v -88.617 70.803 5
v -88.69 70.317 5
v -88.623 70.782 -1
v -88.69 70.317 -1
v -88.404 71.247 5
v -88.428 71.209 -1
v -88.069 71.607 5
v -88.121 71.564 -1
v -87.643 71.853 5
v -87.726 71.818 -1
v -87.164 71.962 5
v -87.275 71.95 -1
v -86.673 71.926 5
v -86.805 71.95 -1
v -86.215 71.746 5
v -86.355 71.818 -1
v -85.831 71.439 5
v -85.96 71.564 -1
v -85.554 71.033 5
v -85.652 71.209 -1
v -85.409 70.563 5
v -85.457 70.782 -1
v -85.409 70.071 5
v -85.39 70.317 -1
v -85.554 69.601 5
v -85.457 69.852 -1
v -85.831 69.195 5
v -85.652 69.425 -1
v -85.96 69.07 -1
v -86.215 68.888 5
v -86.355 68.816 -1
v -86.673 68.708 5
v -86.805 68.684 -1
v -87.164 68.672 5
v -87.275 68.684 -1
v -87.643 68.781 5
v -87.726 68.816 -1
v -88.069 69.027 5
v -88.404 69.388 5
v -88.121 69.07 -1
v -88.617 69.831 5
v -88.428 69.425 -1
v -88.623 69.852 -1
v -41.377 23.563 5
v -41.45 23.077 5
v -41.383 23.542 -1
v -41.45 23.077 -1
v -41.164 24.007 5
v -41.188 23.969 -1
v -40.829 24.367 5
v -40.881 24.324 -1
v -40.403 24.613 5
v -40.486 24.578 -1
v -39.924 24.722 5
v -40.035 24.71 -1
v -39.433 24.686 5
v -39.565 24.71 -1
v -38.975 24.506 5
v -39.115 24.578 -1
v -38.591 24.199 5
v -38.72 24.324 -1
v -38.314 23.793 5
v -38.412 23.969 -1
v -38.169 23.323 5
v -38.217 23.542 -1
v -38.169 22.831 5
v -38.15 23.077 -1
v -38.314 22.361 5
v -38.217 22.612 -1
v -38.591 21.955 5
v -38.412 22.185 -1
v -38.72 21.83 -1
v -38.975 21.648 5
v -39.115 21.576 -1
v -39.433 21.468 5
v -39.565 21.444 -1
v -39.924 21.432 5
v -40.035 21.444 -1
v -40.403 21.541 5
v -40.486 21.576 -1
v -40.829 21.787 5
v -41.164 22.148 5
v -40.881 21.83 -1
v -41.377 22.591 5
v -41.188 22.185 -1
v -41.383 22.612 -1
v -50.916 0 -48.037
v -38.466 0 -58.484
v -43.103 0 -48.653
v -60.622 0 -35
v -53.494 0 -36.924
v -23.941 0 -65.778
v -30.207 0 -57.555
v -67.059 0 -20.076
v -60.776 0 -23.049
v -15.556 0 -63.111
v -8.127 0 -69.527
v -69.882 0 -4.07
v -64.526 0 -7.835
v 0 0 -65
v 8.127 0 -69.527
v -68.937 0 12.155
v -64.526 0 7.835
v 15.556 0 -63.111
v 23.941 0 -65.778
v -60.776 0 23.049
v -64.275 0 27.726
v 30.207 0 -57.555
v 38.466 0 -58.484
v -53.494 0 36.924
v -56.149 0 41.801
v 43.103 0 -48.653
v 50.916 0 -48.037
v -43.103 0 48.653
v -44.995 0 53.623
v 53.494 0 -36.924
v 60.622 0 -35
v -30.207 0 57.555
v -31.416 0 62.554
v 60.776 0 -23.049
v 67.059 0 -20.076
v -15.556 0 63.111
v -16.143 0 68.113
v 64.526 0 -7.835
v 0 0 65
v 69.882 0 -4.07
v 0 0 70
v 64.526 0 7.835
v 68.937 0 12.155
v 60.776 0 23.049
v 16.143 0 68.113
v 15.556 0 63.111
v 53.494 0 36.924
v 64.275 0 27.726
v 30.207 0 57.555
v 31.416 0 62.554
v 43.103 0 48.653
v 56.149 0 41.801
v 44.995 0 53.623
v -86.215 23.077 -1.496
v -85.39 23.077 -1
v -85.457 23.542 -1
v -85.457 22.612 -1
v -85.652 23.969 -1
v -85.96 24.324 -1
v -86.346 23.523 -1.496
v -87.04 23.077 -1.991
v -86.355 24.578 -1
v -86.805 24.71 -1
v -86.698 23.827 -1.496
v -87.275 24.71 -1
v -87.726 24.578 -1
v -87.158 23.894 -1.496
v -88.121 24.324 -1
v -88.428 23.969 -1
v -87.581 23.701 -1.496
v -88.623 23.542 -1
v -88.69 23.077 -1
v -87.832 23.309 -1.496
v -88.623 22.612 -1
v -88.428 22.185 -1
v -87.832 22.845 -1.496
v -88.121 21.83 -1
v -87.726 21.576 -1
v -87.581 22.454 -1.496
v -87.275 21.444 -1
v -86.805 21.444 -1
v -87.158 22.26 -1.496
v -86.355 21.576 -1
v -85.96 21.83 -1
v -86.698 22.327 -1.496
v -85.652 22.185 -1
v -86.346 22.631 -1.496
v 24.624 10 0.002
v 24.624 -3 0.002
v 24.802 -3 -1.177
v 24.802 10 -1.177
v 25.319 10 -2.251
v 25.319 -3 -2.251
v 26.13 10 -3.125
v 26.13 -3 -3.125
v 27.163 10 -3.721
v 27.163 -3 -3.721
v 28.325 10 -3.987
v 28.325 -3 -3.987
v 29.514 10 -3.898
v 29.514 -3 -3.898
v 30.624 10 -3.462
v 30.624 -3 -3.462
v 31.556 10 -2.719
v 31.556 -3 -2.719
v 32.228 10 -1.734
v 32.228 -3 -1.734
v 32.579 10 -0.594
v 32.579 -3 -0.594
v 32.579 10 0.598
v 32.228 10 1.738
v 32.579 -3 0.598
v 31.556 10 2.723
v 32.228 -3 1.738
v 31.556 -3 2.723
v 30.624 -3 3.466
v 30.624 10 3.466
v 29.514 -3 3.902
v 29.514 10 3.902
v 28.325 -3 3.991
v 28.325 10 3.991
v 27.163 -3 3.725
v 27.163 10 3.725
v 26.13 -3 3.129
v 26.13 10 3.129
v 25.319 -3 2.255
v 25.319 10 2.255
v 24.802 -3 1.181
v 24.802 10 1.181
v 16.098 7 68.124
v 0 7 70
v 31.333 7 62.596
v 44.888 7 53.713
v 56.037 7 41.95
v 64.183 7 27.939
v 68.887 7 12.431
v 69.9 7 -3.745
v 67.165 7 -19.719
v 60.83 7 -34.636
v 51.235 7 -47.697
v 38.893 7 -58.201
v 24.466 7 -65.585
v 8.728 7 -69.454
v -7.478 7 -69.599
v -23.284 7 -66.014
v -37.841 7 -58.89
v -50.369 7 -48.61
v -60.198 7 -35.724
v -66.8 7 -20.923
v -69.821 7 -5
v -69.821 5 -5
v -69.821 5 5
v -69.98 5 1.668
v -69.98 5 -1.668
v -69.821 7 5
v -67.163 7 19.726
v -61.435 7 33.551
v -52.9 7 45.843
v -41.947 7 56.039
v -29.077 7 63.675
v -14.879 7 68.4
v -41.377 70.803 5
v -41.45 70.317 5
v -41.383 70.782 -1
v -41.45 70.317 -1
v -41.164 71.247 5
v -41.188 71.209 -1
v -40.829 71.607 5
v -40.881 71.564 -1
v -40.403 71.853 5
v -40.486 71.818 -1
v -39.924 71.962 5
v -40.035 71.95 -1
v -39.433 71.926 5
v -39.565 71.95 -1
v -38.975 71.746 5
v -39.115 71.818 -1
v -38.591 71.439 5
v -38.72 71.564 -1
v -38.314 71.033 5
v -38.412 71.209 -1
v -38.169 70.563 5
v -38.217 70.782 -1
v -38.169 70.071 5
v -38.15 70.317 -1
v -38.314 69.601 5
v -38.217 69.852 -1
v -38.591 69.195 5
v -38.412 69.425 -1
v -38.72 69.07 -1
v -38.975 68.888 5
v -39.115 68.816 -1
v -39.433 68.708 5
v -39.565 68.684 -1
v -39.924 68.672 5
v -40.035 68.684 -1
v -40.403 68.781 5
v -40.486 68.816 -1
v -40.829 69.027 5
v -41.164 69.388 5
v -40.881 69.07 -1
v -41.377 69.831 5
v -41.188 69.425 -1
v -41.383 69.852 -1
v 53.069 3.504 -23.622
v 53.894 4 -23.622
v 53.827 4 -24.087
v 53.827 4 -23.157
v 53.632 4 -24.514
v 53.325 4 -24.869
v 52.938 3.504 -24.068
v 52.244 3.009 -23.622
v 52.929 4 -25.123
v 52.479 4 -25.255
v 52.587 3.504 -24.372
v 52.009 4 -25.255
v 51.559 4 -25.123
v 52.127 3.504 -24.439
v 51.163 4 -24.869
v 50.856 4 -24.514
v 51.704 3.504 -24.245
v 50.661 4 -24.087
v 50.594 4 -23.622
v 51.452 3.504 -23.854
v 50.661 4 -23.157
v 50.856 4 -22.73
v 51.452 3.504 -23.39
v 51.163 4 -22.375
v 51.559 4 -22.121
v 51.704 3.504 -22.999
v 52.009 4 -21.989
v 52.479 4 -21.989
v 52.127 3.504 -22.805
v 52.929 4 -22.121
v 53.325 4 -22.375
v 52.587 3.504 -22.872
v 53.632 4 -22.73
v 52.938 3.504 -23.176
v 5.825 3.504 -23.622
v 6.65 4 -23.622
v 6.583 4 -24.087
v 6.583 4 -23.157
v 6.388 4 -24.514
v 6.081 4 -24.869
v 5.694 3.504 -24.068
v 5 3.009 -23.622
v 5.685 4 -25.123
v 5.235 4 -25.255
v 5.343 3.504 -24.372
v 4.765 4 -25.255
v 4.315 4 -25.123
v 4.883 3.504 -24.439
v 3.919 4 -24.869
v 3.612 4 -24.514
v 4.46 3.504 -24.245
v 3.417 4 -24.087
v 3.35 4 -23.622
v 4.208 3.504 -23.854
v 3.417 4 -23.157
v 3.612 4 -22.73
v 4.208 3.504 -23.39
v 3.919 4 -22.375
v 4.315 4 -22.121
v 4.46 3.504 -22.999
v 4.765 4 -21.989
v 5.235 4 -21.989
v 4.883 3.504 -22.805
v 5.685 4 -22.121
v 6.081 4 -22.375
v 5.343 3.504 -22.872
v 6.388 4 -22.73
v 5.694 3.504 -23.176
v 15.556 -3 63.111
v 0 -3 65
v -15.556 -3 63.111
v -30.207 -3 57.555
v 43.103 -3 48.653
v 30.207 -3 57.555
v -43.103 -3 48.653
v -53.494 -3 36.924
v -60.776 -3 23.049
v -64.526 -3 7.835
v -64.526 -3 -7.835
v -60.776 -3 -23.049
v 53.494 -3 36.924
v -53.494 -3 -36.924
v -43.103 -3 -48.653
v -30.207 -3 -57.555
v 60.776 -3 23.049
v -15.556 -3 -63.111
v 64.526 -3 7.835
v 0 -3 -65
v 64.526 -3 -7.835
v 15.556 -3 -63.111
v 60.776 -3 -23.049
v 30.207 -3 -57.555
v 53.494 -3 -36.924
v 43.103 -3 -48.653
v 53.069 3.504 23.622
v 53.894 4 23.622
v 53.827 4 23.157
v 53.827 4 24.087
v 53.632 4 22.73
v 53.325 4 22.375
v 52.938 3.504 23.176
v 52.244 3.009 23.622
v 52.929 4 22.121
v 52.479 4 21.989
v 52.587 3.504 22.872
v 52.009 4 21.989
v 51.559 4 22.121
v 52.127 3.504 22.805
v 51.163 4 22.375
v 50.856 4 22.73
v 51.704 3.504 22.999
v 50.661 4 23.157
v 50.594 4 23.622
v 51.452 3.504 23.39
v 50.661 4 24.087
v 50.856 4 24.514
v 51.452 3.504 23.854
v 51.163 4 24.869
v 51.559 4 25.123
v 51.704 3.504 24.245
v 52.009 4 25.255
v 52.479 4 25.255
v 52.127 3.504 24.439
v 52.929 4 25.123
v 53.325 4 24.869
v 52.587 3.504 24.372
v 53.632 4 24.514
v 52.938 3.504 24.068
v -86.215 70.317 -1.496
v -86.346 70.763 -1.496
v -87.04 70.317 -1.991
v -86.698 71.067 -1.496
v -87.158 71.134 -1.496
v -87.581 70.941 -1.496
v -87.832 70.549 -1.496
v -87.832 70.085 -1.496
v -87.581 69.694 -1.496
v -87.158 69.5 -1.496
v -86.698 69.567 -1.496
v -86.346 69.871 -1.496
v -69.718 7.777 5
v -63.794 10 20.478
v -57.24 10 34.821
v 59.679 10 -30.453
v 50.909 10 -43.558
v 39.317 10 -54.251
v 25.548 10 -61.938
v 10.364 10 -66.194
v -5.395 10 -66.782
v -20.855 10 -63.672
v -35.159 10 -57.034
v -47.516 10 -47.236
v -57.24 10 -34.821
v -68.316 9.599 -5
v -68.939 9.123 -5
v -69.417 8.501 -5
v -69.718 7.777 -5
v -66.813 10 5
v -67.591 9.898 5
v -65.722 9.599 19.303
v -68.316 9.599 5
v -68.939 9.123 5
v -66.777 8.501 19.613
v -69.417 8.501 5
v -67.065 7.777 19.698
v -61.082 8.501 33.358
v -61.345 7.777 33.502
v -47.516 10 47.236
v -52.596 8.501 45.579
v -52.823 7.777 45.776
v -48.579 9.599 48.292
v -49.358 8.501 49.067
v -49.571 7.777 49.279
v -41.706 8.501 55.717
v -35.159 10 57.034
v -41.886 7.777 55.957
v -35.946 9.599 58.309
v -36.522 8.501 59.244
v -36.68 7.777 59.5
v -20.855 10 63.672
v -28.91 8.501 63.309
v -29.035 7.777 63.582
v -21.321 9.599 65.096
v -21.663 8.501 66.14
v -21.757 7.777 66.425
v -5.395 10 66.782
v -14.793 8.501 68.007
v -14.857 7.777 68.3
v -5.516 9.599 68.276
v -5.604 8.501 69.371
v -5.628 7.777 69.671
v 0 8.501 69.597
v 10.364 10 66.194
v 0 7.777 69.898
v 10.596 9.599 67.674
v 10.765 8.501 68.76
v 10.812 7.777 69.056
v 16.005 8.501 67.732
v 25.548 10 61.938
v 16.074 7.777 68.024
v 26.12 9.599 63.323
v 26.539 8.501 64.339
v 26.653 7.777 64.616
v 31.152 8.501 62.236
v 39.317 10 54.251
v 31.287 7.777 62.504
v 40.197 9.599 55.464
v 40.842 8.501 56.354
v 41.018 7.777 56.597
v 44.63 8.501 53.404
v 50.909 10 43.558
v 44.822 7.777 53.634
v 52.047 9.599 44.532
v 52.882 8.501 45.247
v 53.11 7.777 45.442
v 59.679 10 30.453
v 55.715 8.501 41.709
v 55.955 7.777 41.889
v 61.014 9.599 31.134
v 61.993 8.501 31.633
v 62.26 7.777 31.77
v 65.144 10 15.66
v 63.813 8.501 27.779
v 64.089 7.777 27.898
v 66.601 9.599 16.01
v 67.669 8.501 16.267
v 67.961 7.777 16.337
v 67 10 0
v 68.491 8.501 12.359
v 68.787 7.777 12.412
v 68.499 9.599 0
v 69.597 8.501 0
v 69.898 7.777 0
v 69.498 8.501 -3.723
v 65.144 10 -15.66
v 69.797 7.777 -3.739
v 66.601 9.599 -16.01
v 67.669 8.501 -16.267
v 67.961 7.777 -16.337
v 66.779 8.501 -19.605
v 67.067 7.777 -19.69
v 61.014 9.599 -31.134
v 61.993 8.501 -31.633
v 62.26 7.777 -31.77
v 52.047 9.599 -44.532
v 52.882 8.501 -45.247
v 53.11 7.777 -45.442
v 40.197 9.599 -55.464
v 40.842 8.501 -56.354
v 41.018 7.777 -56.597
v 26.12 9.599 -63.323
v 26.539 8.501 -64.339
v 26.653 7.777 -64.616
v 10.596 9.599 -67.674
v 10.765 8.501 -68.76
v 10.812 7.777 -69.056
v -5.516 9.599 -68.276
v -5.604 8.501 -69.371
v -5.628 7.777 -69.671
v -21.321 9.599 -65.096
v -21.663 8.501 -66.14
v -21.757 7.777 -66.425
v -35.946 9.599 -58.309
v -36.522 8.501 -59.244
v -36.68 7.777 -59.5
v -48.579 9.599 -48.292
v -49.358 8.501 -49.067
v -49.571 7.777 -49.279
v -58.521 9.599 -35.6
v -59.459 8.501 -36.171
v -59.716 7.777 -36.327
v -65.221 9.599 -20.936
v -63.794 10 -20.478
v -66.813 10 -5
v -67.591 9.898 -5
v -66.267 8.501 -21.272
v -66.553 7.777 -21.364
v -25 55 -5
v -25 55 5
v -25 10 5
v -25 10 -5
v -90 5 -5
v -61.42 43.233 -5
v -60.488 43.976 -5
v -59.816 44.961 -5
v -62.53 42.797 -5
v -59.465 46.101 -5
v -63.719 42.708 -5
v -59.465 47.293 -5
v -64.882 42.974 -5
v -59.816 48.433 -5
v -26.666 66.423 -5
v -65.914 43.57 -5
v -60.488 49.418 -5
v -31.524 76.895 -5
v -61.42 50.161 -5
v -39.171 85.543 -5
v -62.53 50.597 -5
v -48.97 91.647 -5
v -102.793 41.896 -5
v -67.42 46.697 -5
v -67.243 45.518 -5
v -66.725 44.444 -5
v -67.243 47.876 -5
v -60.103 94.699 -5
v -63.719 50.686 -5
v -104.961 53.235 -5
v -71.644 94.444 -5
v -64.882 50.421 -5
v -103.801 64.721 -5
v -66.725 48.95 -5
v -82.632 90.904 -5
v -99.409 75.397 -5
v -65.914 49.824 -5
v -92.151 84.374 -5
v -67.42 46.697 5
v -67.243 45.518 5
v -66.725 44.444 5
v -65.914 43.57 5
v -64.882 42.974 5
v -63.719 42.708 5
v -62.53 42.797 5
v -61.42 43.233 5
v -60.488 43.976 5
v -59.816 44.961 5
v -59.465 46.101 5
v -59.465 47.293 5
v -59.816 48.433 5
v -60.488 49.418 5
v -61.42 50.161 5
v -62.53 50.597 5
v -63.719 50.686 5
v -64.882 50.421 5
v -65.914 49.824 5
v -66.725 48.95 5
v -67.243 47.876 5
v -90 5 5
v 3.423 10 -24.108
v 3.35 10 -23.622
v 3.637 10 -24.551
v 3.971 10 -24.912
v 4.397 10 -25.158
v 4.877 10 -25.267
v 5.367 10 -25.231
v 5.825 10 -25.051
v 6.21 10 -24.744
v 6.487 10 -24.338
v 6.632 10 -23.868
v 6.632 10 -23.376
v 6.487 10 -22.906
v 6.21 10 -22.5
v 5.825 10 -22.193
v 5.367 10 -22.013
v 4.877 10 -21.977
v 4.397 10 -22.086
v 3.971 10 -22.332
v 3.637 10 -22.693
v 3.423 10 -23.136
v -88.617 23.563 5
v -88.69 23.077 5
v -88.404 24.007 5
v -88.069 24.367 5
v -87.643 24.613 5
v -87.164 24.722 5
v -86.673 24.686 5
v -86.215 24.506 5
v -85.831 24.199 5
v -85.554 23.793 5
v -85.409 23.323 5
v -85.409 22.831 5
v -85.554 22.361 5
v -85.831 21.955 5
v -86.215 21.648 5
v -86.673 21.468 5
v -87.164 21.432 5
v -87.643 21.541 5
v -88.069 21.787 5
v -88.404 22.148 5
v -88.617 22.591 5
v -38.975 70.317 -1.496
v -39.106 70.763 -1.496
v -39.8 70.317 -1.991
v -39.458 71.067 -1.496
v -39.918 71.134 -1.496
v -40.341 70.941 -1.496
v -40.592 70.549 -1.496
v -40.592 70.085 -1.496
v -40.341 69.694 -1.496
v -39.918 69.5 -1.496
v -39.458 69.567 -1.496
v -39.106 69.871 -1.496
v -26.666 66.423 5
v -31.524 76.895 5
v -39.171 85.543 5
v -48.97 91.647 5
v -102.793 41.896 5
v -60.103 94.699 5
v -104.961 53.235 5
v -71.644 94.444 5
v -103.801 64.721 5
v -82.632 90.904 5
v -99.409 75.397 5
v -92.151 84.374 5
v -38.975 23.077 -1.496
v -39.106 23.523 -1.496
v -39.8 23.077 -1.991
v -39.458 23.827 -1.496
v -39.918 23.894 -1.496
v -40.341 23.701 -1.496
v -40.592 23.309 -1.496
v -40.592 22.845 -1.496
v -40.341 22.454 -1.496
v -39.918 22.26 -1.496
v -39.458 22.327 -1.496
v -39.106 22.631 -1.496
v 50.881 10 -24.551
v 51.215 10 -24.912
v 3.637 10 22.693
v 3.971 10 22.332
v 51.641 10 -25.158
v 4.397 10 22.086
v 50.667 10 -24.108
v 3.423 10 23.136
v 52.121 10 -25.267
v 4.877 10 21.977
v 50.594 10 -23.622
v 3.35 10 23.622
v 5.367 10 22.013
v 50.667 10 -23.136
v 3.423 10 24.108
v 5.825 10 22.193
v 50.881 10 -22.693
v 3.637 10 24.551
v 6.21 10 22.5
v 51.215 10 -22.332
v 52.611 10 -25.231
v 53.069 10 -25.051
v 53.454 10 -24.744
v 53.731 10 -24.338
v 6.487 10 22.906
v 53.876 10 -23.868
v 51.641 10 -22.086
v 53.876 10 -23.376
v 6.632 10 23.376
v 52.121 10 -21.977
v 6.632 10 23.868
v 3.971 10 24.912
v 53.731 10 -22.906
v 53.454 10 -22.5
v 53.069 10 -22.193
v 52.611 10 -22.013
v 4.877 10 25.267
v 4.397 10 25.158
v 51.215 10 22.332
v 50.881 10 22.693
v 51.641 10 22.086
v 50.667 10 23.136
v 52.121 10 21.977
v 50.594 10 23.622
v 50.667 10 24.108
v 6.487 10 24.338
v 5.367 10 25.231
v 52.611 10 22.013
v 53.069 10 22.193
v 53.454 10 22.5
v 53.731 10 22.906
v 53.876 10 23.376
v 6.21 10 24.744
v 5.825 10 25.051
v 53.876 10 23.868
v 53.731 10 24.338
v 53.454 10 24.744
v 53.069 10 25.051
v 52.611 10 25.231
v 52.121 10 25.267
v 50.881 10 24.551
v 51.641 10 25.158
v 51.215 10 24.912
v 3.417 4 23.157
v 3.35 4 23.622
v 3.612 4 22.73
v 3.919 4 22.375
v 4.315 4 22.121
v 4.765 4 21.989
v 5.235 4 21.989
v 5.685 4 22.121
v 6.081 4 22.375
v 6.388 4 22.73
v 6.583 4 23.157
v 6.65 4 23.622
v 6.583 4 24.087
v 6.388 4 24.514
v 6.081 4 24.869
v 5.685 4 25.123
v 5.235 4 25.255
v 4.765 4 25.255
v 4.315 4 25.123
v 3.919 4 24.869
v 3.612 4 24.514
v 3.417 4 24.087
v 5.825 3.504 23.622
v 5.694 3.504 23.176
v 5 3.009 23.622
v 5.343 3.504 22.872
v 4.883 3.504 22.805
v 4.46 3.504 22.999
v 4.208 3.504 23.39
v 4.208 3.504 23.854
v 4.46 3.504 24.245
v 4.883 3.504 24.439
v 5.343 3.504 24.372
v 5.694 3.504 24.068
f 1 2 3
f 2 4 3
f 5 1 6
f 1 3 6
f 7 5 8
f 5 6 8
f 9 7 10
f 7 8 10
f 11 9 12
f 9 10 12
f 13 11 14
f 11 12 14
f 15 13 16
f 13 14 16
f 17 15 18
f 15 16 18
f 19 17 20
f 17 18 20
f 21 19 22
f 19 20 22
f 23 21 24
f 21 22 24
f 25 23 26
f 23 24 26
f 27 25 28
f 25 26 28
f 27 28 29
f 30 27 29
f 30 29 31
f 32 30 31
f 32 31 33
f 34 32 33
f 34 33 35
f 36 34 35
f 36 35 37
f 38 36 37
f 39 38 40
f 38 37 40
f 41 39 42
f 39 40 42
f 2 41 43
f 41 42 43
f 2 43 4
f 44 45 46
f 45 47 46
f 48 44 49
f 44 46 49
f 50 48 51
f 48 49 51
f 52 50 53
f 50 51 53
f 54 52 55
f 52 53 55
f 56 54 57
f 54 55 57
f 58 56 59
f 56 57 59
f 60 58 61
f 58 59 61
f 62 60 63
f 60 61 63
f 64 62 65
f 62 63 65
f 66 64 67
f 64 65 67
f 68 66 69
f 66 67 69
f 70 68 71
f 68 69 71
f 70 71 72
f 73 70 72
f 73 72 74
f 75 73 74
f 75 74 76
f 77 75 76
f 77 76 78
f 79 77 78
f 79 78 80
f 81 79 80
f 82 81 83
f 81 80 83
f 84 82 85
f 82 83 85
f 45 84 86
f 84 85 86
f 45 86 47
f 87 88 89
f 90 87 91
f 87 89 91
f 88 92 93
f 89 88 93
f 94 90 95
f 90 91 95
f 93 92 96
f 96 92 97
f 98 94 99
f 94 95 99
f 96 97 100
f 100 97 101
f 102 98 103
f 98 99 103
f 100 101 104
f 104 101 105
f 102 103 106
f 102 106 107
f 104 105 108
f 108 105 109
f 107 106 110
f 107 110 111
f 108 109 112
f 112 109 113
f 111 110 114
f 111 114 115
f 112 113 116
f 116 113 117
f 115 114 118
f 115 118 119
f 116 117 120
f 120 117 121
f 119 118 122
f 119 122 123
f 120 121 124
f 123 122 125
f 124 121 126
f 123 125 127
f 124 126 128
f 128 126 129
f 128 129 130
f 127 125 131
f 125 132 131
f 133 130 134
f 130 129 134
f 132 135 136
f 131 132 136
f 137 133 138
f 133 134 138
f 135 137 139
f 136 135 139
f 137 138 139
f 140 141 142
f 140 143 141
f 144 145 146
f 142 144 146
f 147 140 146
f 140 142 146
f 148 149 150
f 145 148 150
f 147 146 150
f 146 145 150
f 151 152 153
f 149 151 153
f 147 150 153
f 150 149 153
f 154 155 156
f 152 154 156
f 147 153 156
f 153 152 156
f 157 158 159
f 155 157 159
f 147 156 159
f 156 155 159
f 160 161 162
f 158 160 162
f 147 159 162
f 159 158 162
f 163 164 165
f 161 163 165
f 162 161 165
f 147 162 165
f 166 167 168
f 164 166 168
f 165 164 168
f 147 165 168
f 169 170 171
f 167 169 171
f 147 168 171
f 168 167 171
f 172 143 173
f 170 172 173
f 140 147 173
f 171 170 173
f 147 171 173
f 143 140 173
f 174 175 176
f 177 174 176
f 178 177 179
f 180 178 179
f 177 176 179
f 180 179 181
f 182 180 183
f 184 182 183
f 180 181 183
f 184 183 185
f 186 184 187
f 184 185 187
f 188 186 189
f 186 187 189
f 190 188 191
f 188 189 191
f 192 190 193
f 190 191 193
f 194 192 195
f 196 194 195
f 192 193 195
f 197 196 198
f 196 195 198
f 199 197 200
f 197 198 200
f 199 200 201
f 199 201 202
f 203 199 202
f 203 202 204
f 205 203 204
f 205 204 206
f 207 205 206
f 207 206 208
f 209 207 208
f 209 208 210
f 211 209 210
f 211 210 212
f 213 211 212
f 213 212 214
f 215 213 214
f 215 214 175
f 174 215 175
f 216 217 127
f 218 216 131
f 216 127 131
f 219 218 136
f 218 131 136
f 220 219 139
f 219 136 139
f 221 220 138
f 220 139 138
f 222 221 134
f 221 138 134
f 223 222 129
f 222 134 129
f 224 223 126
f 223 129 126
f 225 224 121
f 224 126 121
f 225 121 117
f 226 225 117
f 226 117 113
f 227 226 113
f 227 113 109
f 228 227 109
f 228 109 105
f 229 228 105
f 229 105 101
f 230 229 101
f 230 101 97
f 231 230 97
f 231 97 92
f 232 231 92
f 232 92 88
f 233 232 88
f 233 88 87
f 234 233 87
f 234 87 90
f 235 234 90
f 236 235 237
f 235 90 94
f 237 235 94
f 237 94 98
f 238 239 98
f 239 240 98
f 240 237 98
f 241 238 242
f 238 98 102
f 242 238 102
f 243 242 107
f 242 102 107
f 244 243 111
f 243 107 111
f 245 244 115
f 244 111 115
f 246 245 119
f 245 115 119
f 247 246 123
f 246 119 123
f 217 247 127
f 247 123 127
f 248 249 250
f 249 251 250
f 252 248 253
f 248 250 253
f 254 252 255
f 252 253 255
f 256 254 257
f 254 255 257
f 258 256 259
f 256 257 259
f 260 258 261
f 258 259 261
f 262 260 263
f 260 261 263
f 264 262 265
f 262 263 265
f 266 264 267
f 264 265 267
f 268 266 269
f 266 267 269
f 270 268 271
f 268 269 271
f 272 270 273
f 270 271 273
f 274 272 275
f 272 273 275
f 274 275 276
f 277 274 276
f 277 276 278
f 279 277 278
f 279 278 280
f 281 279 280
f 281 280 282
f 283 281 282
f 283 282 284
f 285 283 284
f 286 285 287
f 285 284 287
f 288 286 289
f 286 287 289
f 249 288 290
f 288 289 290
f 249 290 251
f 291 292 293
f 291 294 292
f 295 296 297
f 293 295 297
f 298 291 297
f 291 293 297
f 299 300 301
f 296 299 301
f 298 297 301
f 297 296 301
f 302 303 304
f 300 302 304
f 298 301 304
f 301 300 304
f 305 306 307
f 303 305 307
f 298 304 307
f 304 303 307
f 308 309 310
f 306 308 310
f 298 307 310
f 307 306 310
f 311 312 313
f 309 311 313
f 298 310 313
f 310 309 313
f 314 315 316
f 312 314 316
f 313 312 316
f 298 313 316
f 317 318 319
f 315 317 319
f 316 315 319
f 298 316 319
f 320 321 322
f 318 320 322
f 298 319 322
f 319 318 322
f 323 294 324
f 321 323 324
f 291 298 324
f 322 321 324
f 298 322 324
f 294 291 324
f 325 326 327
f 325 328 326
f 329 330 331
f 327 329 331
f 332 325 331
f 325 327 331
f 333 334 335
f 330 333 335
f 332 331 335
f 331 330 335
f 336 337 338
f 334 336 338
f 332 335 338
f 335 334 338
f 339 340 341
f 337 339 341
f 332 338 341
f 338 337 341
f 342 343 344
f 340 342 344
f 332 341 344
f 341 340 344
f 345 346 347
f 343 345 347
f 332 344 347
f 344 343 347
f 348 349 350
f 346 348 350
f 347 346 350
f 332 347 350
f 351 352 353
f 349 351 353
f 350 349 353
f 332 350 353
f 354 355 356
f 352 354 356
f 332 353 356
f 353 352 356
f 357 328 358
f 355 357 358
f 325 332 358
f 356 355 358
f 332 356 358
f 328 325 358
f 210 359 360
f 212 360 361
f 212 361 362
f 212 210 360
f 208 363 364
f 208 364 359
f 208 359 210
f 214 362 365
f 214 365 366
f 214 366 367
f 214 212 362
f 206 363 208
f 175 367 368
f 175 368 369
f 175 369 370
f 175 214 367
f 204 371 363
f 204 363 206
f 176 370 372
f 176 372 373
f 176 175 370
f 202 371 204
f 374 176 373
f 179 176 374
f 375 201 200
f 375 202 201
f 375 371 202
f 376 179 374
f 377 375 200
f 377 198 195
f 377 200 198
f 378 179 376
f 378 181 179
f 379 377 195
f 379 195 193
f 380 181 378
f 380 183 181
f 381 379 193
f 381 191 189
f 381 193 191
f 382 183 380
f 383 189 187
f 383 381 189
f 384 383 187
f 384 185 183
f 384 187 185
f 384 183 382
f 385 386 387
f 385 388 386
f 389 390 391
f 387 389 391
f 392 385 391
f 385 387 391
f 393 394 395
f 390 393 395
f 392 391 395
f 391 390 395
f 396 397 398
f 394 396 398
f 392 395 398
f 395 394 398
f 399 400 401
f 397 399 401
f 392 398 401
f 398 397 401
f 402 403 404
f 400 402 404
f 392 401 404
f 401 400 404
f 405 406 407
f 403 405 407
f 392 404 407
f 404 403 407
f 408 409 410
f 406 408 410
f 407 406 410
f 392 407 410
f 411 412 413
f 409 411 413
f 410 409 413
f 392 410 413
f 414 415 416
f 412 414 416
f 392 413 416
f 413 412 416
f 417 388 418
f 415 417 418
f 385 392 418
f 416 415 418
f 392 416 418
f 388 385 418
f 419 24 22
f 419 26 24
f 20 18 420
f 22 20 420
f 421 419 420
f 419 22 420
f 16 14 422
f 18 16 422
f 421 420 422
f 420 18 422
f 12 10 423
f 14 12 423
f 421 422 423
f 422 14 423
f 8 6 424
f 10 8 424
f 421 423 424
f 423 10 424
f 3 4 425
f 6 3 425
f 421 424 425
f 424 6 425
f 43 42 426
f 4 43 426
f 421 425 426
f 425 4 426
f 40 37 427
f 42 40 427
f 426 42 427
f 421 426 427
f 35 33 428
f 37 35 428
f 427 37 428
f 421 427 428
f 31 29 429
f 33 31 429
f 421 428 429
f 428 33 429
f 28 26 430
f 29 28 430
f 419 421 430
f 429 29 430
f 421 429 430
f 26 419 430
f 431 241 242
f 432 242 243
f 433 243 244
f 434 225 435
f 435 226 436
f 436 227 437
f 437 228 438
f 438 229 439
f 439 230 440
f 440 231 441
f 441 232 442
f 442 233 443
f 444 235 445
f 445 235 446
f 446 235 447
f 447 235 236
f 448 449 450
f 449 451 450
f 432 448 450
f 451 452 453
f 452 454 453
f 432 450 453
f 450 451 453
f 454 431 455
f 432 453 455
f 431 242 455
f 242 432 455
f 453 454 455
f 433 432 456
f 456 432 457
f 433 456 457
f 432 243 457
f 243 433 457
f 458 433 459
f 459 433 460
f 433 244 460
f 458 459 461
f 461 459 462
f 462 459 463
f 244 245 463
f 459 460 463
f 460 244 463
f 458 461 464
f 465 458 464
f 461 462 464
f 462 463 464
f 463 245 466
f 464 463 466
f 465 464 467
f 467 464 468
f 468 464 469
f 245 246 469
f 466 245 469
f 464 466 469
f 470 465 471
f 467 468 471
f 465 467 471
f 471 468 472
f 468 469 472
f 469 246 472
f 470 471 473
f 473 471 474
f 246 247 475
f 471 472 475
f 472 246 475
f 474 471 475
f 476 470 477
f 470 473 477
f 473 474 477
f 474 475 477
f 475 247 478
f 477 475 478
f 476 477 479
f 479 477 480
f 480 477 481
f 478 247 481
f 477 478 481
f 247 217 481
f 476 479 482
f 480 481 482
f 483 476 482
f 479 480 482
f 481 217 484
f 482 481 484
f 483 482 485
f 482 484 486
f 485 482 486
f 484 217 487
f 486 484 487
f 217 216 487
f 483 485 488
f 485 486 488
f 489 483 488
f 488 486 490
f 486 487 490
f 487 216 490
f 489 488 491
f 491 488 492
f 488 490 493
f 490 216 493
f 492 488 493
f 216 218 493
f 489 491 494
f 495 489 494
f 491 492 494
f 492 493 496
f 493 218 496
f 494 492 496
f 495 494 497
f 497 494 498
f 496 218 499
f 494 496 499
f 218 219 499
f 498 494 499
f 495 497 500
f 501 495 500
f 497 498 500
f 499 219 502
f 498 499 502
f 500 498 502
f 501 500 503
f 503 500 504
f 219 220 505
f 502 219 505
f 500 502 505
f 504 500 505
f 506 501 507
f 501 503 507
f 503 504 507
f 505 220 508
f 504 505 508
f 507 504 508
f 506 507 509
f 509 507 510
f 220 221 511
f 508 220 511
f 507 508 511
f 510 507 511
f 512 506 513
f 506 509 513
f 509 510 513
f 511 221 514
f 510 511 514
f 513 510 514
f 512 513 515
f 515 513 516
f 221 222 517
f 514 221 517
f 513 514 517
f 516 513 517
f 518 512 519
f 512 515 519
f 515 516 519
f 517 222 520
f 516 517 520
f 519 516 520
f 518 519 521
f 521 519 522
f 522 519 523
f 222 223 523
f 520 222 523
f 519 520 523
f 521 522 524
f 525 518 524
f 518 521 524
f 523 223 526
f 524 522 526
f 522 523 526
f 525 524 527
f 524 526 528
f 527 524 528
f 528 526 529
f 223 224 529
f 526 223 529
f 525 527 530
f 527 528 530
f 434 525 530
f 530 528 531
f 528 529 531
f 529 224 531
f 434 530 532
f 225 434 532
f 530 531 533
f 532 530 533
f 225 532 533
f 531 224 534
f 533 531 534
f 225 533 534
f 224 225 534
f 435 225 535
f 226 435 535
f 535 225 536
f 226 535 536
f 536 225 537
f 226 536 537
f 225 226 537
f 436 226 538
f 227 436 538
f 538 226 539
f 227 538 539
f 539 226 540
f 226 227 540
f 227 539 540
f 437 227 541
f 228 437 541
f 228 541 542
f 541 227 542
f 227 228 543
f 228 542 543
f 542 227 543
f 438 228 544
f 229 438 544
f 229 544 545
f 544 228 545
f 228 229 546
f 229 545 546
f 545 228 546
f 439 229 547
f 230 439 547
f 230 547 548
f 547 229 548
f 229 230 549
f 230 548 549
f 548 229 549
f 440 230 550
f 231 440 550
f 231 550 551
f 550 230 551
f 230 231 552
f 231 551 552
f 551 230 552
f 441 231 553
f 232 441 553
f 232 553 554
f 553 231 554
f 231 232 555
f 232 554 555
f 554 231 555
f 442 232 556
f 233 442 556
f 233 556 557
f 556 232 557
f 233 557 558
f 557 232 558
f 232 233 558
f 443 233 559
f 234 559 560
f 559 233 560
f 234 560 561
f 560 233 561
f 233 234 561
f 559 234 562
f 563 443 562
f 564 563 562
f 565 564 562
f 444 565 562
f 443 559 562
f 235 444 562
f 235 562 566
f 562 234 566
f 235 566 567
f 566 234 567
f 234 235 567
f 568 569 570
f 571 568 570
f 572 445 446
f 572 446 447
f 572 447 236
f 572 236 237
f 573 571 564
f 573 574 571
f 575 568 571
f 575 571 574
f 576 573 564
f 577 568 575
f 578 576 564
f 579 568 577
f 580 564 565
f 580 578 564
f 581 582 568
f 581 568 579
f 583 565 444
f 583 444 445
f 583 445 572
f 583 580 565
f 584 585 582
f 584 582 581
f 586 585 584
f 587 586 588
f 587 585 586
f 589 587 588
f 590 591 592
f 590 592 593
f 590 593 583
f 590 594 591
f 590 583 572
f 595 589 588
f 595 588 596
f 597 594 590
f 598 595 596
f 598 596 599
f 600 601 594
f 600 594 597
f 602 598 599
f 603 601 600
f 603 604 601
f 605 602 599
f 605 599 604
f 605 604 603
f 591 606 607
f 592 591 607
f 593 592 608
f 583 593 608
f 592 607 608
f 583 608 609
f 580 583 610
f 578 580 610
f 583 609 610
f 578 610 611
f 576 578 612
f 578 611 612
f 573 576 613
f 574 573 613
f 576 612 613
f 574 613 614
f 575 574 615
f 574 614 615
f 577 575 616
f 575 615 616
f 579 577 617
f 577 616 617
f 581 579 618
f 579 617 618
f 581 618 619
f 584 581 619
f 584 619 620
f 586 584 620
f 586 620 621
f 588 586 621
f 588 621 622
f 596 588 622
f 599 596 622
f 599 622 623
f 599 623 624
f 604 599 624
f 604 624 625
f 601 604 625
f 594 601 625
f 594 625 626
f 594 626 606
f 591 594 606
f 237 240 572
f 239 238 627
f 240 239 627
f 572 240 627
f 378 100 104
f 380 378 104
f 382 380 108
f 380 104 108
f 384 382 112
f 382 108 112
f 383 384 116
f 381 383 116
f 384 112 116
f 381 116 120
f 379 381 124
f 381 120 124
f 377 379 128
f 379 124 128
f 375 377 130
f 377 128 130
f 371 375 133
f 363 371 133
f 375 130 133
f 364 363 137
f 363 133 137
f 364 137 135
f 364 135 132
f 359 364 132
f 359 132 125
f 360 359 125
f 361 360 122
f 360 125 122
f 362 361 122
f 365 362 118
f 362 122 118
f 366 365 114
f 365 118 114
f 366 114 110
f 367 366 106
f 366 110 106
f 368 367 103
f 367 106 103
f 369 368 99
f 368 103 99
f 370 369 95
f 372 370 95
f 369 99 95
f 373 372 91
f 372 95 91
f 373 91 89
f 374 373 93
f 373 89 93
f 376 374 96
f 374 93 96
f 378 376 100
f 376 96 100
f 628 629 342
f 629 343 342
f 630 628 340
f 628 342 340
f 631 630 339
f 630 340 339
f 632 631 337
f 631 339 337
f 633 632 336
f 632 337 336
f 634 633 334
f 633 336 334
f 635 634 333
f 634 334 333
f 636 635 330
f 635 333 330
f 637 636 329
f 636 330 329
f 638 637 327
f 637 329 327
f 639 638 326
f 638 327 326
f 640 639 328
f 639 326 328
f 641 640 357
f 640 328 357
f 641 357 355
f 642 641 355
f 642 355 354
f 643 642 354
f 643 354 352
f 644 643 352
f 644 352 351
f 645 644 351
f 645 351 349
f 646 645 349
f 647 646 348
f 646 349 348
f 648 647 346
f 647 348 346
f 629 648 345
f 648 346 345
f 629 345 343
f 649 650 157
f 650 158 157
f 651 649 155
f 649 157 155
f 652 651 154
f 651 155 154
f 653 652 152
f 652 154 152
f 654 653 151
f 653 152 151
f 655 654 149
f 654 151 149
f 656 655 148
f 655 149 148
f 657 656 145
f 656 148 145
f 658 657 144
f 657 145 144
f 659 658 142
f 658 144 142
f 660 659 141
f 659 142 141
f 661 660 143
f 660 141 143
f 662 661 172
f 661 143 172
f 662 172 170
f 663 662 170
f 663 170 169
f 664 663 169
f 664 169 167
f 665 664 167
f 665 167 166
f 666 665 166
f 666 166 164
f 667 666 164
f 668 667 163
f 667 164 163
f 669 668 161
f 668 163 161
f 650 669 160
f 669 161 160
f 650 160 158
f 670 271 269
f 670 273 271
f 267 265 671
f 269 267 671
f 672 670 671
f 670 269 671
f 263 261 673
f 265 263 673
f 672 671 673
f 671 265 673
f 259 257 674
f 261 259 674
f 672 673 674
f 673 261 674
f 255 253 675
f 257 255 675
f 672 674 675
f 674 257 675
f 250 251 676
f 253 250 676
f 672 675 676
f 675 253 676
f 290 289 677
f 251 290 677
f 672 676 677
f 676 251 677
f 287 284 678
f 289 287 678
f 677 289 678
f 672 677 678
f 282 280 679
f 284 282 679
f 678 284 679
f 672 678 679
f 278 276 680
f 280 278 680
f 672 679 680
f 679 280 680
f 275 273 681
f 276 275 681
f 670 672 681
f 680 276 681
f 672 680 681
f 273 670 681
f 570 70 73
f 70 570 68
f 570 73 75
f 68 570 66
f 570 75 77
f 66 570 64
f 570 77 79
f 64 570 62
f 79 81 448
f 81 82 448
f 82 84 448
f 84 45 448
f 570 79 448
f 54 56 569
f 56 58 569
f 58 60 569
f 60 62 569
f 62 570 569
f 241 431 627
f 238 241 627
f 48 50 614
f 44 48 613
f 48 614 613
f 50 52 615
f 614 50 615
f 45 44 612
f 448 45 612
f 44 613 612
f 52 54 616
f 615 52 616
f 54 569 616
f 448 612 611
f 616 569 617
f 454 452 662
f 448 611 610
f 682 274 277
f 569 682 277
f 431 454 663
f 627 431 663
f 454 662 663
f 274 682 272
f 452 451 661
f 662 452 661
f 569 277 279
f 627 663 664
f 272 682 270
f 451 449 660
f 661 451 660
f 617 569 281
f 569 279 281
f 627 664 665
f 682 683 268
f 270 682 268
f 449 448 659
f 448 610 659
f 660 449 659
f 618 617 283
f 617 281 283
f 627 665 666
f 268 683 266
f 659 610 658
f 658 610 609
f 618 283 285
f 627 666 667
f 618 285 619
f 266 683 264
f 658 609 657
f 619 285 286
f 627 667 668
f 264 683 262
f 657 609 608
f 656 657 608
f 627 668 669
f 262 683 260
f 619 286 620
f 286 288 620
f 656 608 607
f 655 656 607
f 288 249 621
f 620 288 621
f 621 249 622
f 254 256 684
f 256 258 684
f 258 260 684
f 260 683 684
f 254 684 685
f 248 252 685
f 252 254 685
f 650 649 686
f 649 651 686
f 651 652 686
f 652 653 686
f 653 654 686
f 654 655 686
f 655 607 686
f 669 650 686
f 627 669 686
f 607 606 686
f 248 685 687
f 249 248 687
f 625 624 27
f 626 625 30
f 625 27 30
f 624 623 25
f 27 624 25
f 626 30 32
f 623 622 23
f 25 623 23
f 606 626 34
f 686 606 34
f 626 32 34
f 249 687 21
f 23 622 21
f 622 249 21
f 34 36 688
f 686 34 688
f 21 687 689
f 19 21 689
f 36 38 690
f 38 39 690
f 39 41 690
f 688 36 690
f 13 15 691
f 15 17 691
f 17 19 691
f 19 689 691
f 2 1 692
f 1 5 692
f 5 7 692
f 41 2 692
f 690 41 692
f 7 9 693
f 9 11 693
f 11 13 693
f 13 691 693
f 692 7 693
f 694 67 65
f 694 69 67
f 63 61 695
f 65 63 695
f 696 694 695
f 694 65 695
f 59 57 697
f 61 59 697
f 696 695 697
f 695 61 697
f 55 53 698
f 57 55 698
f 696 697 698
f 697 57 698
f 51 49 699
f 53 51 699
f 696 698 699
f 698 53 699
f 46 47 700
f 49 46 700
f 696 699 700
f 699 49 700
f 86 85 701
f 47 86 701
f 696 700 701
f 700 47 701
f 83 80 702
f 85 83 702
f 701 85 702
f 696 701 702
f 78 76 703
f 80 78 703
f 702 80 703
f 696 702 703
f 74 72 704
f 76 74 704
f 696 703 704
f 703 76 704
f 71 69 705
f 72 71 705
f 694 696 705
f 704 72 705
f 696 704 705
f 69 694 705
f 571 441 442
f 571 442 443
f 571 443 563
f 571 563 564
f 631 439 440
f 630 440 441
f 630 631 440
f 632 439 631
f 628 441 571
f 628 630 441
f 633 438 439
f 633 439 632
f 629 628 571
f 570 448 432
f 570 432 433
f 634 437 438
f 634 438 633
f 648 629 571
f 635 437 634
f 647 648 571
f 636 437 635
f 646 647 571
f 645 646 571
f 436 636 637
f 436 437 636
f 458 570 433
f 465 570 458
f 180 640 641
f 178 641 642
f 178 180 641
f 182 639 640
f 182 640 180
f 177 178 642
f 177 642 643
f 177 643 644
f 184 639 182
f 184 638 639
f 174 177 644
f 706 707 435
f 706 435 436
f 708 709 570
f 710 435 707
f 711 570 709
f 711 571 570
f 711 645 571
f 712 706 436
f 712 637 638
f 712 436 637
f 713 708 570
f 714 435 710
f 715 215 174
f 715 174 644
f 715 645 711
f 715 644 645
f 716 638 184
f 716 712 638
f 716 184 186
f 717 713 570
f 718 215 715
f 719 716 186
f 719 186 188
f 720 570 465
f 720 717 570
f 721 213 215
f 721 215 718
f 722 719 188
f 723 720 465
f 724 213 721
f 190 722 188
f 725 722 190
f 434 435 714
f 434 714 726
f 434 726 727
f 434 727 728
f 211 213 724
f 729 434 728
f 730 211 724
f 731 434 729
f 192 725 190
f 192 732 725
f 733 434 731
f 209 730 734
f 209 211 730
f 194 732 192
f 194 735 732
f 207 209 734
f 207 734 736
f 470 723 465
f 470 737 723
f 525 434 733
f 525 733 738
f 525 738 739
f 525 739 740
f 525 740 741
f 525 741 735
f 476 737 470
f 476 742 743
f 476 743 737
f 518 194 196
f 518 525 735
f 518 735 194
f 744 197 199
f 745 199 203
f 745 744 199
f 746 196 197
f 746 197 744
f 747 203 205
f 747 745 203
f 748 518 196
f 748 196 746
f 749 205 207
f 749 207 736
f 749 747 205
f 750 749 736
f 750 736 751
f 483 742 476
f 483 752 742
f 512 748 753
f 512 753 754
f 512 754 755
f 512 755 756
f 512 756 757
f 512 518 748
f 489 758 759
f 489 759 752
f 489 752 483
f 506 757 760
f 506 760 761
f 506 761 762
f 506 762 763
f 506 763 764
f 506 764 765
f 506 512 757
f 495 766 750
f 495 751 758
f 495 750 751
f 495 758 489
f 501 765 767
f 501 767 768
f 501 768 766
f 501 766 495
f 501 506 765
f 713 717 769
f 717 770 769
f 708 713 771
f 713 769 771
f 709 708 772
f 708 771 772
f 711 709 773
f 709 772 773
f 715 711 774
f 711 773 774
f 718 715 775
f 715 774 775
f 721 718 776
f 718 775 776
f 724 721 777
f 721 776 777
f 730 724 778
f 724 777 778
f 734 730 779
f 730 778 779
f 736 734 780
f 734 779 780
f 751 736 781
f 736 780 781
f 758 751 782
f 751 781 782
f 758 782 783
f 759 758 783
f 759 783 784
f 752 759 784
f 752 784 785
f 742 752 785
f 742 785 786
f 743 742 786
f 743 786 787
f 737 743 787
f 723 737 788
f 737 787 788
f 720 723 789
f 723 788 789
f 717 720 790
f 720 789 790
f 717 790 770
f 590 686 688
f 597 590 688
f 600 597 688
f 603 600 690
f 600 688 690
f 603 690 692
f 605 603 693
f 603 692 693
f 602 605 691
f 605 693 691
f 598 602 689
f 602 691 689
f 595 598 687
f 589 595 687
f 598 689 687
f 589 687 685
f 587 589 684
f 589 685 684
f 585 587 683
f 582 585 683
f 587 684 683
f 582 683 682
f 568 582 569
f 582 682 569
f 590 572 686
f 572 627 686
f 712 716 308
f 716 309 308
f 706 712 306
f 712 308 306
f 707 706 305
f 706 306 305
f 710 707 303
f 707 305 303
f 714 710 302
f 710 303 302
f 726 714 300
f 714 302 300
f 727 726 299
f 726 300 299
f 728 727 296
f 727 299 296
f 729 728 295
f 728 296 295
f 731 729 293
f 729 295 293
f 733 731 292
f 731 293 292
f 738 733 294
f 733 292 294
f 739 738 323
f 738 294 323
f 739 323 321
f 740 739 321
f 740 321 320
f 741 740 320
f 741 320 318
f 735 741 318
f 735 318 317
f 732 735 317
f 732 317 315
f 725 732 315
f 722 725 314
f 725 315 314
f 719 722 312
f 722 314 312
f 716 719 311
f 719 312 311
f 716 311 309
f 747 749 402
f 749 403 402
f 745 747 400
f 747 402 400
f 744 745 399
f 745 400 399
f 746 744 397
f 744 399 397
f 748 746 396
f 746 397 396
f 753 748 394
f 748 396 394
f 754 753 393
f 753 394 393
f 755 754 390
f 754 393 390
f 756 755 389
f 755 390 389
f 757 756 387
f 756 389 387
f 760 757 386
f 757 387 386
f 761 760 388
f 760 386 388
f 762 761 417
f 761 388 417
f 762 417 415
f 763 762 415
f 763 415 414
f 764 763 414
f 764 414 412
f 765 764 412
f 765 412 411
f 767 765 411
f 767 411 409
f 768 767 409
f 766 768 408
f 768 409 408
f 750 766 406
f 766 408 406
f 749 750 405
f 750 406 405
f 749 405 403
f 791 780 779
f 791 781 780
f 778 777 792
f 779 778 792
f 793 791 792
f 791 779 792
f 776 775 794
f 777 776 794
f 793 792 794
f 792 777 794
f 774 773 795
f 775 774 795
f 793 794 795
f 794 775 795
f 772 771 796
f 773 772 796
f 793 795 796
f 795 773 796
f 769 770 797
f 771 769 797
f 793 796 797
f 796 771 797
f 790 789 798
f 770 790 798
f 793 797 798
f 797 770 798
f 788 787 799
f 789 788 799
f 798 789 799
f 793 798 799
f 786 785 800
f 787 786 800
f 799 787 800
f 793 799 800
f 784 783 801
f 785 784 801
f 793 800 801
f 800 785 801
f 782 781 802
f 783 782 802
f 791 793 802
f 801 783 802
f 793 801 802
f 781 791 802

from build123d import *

# Parameters (mm, degrees)
SKETCH1_R                 = 70
BOSS_EXTRUDE1_DEPTH       = 10
SKETCH2_R                 = 65
BOSS_EXTRUDE4_DEPTH       = 3
BOSS_EXTRUDE5_DEPTH       = 5
M4X0_7_TAPPED_HOLE1_D     = 3.3
M4X0_7_TAPPED_HOLE1_DEPTH = 6
M4X0_7_TAPPED_HOLE1_TIP   = 0.991420021
F_8_0MM_DOWEL_HOLE2_D     = 8
M4X0_7_TAPPED_HOLE3_D     = 3.3
M4X0_7_TAPPED_HOLE3_DEPTH = 6
M4X0_7_TAPPED_HOLE3_TIP   = 0.991420021
F_8_0MM_DOWEL_HOLE3_D     = 8
FILLET1_R                 = 3


with BuildPart() as part:
    # Sketch1 → Boss-Extrude1 (new body)
    with BuildSketch(Plane(origin=(0, 0, 0), x_dir=(1, 0, 0), z_dir=(0, 1, 0))):
        with Locations(Location((0, 0, 0), (0, 0, 270))):
            Circle(SKETCH1_R)
    extrude(amount=BOSS_EXTRUDE1_DEPTH)

    # Sketch2 → Boss-Extrude4 (add)
    with BuildSketch(Plane.XZ):
        with Locations(Location((0, 0, 0), (0, 0, 270))):
            Circle(SKETCH2_R)
    extrude(amount=BOSS_EXTRUDE4_DEPTH)

    # Sketch3 → Boss-Extrude5 (add, symmetric)
    with BuildSketch(Plane.XY):
        with BuildLine():
            Line((-25, 55), (-25, 5))
            Line((-25, 5), (-90, 5))
            Line((-90, 5), (-102.792798963, 41.896399481))
            ThreePointArc((-102.792798963, 41.896399481), (-71.644096684, 94.444340269), (-25, 55))
        make_face()
    extrude(amount=BOSS_EXTRUDE5_DEPTH, both=True)

    # M4x0.7 Tapped Hole1
    with Locations(Plane(origin=(0, 10, 0), x_dir=(1, 0, 0), z_dir=(0, 1, 0))):
        with Locations((5, 23.622), (52.244, 23.622), (52.244, -23.622), (5, -23.622)):
            Hole(M4X0_7_TAPPED_HOLE1_D / 2, depth=M4X0_7_TAPPED_HOLE1_DEPTH)
            with Locations((0, 0, -(M4X0_7_TAPPED_HOLE1_DEPTH + M4X0_7_TAPPED_HOLE1_TIP / 2))):  # 118° drill point
                Cone(0, M4X0_7_TAPPED_HOLE1_D / 2, M4X0_7_TAPPED_HOLE1_TIP, mode=Mode.SUBTRACT)

    # Ø8.0mm Dowel Hole2 (through all)
    with Locations(Plane(origin=(0, 0, -5), x_dir=(1, 0, 0), z_dir=(0, 0, -1))):
        with Locations((-63.420285579, -46.697024874)):
            Hole(F_8_0MM_DOWEL_HOLE2_D / 2)

    # M4x0.7 Tapped Hole3
    with Locations(Plane.XY.offset(5)):
        with Locations((-87.040285579, 70.317024874), (-39.800285579, 70.317024874), (-39.800285579, 23.077024874), (-87.040285579, 23.077024874)):
            Hole(M4X0_7_TAPPED_HOLE3_D / 2, depth=M4X0_7_TAPPED_HOLE3_DEPTH)
            with Locations((0, 0, -(M4X0_7_TAPPED_HOLE3_DEPTH + M4X0_7_TAPPED_HOLE3_TIP / 2))):  # 118° drill point
                Cone(0, M4X0_7_TAPPED_HOLE3_D / 2, M4X0_7_TAPPED_HOLE3_TIP, mode=Mode.SUBTRACT)

    # Ø8.0mm Dowel Hole3 (through all)
    with Locations(Plane(origin=(0, 10, 0), x_dir=(1, 0, 0), z_dir=(0, 1, 0))):
        with Locations((28.624, -0.002)):
            Hole(F_8_0MM_DOWEL_HOLE3_D / 2)

    # Fillet1
    fillet1_edges = [part.edges().sort_by_distance(p)[0] for p in [
        (51.23475383, 10, -47.696960071),
    ]]
    fillet(fillet1_edges, radius=FILLET1_R)


solid = part.part
